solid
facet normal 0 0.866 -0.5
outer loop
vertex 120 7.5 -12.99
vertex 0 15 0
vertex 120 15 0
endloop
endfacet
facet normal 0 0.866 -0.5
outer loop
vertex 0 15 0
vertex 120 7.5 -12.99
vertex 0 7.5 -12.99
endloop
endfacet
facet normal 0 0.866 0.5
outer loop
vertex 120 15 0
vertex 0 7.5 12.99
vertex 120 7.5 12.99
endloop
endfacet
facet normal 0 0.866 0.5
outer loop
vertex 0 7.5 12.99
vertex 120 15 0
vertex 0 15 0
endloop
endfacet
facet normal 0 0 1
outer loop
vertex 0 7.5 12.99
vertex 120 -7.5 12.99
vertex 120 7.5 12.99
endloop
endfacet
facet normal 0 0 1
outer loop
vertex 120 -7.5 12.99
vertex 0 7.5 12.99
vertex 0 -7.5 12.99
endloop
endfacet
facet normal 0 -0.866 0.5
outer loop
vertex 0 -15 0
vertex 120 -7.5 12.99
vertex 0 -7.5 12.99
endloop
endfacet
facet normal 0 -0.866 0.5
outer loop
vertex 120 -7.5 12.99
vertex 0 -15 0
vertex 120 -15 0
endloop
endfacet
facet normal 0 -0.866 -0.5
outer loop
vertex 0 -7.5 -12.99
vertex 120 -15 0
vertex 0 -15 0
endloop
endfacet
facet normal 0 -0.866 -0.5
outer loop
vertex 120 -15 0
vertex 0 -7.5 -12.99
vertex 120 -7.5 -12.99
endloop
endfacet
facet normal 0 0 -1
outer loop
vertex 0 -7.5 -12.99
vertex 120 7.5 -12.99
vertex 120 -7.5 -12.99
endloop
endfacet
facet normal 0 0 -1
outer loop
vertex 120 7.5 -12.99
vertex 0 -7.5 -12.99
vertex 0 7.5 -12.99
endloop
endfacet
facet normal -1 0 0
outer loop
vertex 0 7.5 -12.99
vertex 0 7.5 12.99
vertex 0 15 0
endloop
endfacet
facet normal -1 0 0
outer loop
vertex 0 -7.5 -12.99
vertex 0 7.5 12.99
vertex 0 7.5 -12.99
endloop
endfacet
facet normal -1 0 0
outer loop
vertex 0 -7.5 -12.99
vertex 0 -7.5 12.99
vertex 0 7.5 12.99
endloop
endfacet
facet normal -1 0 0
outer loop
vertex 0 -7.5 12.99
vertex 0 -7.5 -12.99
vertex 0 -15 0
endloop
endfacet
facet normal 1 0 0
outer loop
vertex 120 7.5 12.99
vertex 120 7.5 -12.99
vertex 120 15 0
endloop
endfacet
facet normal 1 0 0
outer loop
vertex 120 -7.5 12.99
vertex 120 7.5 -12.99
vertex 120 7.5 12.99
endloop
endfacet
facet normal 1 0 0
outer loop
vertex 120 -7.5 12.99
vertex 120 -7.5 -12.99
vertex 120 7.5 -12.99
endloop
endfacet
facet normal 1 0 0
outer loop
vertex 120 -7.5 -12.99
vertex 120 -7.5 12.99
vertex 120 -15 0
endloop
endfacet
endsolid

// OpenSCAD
rotate([60/2, 0, 0])
  rotate([0, 90, 0])
  cylinder(r=15, h=120, $fn=6);
